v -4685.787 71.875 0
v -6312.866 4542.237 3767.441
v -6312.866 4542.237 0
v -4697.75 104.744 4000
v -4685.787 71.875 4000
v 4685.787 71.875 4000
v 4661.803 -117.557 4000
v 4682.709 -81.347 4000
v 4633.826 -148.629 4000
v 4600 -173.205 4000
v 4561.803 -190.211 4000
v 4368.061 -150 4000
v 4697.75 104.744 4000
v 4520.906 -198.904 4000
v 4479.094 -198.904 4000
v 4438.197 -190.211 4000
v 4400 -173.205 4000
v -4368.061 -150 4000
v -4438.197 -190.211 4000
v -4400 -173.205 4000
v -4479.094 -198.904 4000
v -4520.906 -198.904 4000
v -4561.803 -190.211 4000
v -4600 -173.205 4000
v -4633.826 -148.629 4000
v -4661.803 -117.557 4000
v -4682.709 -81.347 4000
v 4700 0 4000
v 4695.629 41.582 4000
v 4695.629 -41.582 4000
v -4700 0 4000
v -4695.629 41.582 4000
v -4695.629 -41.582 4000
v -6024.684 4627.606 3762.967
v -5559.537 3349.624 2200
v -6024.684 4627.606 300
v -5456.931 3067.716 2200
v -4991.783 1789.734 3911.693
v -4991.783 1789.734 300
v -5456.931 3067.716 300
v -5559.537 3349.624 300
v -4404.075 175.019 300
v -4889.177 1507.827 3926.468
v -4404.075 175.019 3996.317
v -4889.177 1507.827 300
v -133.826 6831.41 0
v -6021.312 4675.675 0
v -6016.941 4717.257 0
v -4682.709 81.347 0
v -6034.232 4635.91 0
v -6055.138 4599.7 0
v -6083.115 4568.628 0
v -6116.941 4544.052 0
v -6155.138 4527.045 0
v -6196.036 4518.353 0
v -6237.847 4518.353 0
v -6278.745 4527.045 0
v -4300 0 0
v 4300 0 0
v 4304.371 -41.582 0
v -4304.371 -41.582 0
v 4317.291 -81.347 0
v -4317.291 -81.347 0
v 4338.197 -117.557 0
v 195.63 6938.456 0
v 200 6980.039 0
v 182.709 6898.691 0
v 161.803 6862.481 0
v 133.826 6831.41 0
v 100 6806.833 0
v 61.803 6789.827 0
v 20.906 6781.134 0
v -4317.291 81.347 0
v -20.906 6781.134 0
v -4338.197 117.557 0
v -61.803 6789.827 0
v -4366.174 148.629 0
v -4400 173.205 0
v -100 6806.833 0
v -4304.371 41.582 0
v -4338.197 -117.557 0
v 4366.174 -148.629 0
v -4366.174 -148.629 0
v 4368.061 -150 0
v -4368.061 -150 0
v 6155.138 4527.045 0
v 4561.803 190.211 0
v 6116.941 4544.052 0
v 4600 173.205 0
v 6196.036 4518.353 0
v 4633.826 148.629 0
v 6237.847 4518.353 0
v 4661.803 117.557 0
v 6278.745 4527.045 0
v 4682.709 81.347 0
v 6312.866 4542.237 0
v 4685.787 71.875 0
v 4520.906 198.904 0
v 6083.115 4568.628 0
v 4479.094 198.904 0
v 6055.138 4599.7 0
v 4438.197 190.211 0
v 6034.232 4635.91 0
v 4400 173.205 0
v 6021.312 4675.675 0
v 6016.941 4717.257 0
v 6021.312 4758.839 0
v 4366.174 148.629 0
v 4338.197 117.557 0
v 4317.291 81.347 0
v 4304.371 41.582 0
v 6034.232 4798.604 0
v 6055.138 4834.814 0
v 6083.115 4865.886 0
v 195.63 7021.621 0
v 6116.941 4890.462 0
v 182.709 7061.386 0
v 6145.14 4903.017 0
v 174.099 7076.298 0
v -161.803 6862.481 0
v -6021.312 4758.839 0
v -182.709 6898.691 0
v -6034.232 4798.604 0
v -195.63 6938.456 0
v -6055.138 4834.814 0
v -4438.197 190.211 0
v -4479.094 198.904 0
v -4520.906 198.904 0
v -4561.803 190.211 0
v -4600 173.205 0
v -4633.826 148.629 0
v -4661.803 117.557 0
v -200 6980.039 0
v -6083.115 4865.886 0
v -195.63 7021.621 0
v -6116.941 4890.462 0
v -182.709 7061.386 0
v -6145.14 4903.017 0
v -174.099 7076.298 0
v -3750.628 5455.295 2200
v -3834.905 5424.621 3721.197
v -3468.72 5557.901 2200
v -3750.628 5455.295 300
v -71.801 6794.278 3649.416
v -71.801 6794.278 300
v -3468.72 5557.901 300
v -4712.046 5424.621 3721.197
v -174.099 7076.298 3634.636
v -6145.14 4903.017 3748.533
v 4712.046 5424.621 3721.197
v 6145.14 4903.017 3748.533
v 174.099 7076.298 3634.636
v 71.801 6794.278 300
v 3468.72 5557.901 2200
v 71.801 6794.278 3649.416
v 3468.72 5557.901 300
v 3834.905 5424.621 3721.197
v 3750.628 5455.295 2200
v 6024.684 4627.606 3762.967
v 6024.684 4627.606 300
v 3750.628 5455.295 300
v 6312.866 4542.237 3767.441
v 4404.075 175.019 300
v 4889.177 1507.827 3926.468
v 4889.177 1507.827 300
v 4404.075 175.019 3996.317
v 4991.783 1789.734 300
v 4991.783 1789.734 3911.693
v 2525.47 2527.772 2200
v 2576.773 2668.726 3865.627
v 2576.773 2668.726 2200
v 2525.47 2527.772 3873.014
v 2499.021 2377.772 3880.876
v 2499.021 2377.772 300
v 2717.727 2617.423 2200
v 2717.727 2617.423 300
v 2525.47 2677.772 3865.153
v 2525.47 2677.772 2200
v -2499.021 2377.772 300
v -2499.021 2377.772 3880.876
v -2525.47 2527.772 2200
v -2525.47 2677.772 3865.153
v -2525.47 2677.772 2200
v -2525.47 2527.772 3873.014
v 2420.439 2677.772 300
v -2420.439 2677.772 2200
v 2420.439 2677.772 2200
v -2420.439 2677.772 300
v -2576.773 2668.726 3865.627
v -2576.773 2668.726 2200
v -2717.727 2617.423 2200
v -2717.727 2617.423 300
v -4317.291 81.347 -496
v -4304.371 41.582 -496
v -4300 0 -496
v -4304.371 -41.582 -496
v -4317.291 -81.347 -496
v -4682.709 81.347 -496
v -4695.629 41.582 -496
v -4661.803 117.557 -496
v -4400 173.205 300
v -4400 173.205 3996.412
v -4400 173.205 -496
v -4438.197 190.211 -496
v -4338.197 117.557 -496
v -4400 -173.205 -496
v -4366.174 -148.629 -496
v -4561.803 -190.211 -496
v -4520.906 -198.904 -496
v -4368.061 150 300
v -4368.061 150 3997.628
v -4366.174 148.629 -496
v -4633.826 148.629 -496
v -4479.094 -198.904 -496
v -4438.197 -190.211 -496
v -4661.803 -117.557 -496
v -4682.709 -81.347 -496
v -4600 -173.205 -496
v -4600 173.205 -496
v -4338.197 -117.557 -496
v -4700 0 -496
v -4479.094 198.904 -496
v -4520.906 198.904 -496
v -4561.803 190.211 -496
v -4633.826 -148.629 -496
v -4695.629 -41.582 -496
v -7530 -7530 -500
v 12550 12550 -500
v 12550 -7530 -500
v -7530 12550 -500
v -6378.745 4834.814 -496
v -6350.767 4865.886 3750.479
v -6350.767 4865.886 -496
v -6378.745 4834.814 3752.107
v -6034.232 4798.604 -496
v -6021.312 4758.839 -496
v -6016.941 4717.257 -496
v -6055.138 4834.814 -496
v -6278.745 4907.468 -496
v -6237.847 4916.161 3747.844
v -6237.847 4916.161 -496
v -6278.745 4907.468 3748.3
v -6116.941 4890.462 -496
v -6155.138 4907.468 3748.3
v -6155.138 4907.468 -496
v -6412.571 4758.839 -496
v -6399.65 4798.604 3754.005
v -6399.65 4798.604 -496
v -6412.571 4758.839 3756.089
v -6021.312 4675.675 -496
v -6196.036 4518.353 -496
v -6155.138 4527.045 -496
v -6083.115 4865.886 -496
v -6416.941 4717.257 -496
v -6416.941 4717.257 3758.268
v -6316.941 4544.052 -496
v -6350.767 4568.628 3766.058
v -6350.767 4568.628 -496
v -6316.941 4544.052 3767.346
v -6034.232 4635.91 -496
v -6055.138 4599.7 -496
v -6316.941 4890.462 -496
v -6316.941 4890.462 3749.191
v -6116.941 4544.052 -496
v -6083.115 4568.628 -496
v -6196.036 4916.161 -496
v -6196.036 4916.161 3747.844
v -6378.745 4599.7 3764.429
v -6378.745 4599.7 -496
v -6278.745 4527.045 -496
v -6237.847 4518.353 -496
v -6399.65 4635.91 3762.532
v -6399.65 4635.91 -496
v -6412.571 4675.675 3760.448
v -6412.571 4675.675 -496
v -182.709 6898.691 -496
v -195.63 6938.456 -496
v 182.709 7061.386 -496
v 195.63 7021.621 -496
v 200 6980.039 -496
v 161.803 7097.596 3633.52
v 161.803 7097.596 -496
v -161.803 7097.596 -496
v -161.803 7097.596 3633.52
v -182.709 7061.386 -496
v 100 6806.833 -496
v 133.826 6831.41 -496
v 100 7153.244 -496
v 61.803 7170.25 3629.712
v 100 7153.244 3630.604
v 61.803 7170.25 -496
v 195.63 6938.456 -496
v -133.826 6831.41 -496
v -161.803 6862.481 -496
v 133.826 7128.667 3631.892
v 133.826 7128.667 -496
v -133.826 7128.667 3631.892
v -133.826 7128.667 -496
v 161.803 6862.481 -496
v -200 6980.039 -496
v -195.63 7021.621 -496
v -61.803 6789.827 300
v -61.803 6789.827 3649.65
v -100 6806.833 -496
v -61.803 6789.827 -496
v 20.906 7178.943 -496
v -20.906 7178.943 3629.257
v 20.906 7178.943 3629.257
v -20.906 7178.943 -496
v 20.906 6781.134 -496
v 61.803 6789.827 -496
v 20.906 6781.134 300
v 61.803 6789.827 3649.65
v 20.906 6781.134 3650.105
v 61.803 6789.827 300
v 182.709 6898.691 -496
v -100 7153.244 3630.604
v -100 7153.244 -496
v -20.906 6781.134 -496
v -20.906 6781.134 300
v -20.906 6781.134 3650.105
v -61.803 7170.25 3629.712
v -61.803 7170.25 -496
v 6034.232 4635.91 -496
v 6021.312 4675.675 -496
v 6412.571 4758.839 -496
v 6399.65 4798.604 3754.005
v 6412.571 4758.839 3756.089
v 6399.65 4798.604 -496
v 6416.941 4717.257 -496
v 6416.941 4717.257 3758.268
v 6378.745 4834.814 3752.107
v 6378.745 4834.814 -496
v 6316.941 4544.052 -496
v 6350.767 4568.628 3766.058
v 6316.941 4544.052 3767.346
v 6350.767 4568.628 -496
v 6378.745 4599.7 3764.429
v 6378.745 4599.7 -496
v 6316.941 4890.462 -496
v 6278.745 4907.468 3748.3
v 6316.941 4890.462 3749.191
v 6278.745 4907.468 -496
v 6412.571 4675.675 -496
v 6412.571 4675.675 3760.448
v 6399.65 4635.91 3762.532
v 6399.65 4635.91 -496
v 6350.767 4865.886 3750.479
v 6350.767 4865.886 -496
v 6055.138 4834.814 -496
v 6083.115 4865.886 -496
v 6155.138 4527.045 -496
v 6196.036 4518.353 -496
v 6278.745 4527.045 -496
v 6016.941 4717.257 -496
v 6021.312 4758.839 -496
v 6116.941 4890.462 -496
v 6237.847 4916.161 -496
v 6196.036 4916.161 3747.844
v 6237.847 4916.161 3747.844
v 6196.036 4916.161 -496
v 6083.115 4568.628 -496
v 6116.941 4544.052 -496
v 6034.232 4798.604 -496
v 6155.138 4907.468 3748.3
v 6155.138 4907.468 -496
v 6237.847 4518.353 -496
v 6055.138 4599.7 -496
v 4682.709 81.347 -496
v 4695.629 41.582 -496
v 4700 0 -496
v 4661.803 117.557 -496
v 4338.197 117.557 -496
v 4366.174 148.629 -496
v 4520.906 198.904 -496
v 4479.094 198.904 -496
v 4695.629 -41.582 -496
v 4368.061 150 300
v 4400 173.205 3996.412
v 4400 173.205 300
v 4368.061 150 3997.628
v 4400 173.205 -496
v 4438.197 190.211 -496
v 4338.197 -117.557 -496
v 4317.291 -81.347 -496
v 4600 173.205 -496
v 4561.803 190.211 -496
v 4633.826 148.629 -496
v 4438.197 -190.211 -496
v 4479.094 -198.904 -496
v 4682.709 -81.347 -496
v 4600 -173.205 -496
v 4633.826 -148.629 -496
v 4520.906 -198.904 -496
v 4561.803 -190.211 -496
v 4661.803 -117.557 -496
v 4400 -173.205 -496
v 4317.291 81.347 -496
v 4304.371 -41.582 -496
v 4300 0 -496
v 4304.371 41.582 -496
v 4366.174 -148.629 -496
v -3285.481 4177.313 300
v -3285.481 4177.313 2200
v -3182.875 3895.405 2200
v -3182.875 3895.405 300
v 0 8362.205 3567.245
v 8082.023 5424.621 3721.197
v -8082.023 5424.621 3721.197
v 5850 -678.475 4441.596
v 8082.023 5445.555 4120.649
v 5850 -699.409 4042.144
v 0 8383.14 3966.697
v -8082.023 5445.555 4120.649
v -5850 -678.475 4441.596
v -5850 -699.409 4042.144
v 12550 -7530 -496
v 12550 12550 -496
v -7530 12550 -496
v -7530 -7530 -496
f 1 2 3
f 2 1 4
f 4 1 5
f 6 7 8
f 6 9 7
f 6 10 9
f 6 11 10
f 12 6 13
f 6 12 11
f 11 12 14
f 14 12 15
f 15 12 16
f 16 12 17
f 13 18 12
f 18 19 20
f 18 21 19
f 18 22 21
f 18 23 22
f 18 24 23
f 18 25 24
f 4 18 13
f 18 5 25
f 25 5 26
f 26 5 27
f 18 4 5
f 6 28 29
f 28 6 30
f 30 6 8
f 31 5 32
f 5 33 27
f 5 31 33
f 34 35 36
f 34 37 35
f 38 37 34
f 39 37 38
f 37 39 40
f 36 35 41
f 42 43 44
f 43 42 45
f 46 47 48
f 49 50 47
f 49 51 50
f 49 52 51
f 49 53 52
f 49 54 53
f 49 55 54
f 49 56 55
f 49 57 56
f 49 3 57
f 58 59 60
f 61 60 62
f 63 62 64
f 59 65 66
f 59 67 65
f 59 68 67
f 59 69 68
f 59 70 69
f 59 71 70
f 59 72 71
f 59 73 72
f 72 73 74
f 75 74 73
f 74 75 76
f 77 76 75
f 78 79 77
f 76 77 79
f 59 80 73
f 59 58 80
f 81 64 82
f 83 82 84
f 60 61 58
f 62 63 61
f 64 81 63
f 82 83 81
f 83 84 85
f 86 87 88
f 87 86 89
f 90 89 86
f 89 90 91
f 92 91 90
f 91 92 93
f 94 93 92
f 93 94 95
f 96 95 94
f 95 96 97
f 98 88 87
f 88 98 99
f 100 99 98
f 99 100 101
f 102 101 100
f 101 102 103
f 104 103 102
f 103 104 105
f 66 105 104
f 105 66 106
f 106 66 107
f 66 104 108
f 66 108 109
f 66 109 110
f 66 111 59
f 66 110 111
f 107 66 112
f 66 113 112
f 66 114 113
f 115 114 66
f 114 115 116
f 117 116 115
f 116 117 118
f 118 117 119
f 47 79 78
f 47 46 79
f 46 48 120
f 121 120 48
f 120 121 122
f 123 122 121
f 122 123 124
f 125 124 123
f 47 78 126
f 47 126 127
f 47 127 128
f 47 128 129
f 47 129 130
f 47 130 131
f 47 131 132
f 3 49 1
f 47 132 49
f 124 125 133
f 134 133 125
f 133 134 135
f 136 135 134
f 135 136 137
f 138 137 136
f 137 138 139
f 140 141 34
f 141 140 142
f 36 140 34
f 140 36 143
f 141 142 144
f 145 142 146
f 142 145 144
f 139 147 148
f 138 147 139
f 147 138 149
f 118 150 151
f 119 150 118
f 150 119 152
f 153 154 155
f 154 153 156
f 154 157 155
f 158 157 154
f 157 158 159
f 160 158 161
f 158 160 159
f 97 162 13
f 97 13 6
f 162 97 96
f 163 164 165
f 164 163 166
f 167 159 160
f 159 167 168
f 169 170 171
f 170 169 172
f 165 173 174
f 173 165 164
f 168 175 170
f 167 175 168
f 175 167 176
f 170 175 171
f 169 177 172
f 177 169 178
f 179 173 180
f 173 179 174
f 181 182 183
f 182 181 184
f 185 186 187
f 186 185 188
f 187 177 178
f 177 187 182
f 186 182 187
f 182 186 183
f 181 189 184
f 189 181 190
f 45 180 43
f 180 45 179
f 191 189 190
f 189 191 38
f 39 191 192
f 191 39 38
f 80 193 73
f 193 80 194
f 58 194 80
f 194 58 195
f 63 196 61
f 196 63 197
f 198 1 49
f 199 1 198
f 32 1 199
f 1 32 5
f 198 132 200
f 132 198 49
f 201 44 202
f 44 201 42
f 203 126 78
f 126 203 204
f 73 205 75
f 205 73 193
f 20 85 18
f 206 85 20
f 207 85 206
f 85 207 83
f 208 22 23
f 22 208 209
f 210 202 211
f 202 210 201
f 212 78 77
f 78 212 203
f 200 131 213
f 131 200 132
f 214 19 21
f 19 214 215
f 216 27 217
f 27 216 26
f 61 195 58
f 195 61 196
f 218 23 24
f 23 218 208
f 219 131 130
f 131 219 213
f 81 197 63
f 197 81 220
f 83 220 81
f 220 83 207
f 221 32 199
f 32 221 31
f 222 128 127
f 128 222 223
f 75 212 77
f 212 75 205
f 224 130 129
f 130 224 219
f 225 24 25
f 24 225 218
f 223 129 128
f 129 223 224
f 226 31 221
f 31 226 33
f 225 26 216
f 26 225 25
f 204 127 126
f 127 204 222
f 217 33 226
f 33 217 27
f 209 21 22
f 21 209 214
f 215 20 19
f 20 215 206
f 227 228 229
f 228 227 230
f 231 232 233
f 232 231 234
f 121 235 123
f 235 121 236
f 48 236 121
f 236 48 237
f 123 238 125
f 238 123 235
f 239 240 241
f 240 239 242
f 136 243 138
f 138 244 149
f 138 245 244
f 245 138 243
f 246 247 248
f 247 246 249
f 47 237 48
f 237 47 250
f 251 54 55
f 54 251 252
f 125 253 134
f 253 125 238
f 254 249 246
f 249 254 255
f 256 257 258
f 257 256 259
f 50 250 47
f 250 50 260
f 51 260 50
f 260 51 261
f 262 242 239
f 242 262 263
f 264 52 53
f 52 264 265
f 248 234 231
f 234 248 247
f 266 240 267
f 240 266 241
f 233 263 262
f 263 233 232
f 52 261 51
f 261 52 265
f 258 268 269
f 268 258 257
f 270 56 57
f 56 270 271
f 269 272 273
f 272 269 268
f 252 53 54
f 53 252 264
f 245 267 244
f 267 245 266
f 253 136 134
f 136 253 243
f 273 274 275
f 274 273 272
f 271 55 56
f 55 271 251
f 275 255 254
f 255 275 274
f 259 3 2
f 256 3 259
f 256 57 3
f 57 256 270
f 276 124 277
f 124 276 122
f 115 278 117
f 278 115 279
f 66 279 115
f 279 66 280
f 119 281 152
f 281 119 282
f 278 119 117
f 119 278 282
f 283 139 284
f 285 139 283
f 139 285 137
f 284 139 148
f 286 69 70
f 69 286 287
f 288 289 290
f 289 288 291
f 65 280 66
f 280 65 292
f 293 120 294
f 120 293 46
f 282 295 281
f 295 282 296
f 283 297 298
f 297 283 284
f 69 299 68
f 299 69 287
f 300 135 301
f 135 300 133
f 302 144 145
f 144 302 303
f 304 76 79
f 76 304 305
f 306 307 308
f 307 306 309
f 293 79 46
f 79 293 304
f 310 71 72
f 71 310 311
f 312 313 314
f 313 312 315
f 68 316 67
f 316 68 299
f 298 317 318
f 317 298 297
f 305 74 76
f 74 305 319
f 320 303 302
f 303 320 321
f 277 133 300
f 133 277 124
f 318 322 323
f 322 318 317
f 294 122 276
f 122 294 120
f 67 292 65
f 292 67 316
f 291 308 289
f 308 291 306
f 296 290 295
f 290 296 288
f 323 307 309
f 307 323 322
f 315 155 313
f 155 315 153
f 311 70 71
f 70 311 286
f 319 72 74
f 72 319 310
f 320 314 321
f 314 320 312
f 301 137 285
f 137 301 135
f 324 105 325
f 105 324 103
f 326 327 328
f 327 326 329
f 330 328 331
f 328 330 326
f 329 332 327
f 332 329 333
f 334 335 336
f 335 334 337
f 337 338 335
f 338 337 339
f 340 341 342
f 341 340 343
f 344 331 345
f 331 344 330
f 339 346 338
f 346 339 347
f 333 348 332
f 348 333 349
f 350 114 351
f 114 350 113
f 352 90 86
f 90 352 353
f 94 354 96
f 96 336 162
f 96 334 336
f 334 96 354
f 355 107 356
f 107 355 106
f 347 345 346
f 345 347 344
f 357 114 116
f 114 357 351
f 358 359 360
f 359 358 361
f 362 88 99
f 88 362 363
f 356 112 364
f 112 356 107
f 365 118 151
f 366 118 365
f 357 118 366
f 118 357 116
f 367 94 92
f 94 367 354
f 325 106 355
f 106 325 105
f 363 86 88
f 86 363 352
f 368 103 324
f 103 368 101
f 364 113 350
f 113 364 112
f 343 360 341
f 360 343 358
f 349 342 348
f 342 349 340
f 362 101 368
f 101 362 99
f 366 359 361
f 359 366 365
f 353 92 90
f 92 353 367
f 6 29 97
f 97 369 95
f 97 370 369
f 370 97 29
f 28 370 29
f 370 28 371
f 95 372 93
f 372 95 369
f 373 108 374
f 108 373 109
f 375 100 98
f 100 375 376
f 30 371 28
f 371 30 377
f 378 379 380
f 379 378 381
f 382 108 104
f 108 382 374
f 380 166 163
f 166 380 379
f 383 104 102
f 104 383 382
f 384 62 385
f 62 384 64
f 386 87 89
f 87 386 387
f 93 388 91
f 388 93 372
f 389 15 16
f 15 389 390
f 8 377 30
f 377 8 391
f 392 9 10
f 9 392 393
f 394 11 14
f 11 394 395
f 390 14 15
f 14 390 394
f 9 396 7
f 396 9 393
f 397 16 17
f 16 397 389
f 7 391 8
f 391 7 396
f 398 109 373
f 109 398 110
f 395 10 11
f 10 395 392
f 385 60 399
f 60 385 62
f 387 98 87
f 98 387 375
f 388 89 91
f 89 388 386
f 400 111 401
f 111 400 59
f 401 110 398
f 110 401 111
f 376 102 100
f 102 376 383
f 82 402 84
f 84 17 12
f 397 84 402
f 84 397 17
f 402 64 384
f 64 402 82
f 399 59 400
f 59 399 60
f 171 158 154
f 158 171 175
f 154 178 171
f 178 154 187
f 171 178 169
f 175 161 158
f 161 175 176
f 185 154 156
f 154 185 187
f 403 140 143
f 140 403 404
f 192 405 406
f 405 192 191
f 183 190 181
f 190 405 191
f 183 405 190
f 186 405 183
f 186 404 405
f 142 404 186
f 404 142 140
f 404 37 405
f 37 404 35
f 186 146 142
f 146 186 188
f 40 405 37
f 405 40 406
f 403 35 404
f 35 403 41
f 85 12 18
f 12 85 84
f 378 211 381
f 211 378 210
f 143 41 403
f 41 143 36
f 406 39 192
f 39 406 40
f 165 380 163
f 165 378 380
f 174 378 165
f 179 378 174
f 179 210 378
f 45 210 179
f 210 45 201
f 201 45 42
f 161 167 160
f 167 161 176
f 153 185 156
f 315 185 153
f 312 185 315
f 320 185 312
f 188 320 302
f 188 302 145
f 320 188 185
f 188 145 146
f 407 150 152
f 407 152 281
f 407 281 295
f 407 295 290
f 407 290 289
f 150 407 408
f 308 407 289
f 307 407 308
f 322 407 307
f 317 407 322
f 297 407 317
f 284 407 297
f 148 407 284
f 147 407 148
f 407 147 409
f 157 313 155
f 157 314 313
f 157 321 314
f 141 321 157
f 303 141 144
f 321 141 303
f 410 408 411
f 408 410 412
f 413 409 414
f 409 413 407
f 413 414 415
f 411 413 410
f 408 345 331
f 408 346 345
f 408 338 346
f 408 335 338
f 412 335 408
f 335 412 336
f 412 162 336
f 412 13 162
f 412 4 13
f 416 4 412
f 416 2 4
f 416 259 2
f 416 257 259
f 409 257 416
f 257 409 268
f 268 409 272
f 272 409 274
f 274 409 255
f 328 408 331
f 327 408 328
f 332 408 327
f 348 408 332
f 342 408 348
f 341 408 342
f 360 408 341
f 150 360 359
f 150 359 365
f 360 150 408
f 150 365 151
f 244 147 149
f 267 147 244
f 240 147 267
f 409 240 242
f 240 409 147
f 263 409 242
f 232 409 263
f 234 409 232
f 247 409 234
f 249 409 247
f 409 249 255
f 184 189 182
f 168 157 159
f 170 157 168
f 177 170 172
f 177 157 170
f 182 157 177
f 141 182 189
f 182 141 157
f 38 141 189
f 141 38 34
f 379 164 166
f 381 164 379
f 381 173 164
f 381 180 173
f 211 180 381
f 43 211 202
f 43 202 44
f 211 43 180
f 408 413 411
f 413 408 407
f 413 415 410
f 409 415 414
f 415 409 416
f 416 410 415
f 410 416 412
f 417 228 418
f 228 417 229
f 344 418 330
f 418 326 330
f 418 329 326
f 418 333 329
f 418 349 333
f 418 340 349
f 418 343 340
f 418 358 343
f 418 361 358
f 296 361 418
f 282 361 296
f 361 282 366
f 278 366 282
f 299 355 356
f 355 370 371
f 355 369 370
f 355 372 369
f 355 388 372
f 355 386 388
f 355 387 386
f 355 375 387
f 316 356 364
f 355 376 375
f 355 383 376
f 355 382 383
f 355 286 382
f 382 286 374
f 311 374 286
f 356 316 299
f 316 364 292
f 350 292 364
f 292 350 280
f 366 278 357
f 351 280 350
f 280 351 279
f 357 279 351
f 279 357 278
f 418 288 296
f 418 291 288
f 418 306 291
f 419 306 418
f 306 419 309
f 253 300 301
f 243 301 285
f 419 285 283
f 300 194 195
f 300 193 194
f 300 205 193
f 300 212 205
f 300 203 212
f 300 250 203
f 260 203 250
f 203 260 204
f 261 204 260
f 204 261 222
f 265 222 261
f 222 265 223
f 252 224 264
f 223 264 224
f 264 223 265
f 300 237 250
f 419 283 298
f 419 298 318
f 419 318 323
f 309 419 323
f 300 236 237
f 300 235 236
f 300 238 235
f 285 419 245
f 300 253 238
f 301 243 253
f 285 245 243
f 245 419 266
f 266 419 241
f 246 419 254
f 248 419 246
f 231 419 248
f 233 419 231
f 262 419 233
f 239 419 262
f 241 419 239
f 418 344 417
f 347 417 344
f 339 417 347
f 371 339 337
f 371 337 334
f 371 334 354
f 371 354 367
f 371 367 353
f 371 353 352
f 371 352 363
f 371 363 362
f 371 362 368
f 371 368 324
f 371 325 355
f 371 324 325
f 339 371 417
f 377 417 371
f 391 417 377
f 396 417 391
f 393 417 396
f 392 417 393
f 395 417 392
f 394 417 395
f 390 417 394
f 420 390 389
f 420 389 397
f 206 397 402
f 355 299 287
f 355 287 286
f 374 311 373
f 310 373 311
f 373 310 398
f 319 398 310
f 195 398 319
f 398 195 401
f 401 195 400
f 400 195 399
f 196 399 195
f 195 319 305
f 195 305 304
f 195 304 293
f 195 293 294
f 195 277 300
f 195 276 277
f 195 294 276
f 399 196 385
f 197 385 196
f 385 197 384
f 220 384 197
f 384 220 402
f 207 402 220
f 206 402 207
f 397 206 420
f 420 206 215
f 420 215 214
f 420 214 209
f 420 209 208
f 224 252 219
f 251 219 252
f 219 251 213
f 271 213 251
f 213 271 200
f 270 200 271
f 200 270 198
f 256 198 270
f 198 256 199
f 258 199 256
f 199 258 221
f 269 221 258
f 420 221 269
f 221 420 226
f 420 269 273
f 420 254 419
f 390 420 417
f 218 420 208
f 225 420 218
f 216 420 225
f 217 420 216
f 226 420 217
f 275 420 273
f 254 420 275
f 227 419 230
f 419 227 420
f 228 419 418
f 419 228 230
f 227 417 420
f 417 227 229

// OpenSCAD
// file: element.scad
// constants
gr = 1.61803; // golden ration

// calculate the coordinates for the corners
function point(i, r, corners) =
   let (vz = 360/corners/2)
   let (angle=i*(360/corners) - vz)
   [ r*cos(angle)
   , r*sin(angle)
   ];

function inbetween(p1, p2, procent) =
    let (x_diff = p2[0] - p1[0])
    let (y_diff = p2[1] - p1[1])
    [ p1[0] + x_diff*procent/100
    , p1[1] + y_diff*procent/100
    ];

module glas_color() {
    color("lightblue")
    children();
}

// create a wall
module wall(p1, p2, h, thickness = 300) {
    let (x_diff = p2[0] - p1[0])
    let (y_diff = p2[1] - p1[1])
    let (len = sqrt(pow(x_diff, 2) +
                    pow(y_diff, 2)))
    linear_extrude(height = h)
    translate(p1)
    rotate(atan2(y_diff, x_diff))
    translate([0, -thickness/2])
    square([len, thickness]);
}

module octagon(r, h, corners) {
    coords=[for (i = [0:corners-1]) point(i, r, corners)];
    linear_extrude(height = h)
    polygon(coords);
}

module octawalls(r, h, wt, corners) {
    difference () {
        octagon(r, h, corners);
        translate([0, 0, -wt])
        octagon(r - wt, h + 2*wt, corners);
    }
}

module window(p1, p2, pos, height, sizex, sizey, wt = 300) {
    assert(0 < pos && pos < 100);
    x_diff = p2[0] - p1[0];
    y_diff = p2[1] - p1[1];
    len = sqrt(pow(x_diff, 2) +
               pow(y_diff, 2));
    difference () {
        children();
        // create the hole for the window
        translate([0,0,height])
        translate(p1 + pos*[x_diff, y_diff]/100)
        rotate(atan2(y_diff, x_diff) + 90, [0,0,1])
        cube([4*wt, sizex, sizey], center = true);
    }
    // add the glass to the window
    glas_color()
    translate([0,0,height])
    translate(p1 + pos*[x_diff, y_diff]/100)
    rotate(atan2(y_diff, x_diff) + 90, [0,0,1])
    translate([wt/2, 0, 0])
    cube([wt/2, sizex, sizey], center = true);
}
// main file
include <element.scad>

// configure the rendering
show_floor = true;
show_roof = true;
show_lawn = true;

// configure the house

// bathroom
bath_l = 2720;
bath_w = 1660;

// bedroom
bed_l = 3320;
bed_w = 2720;

// outer size
house_h = 4000; // house height
room_h = 2200;  // room height
oh = 600;       // over-hang of the roof
log_d = 400;    // log diameter
angle = 20;     // angle of the left and right walls from center
w = 6000;       // front width of winter garden
ws = 1700;      // winter-garden side length
s = ws + bed_l; // left and right wall lengths
o = 1500;       // offset left and right of left and right walls

module win(p1, p2, pos, height, sizex, sizey, wt = 300) {
    window(p1, p2, pos, height, sizex, sizey, wt)
    children();
}

// Corners of the outer walls of house
p1 = [-o + -w/2, 0];
p2 = [-o + -w/2, 0] - [s*sin(angle), -s*cos(angle)];
p3 = [0, p2[1]] - [0, p2[0]*tan(angle)];
p4 = [o + w/2, 0] + [s*sin(angle), s*cos(angle)];
p5 = [o + w/2, 0];
p6 = inbetween(p5, p4, 100*ws/s);
p7 = p6 + bed_w*[-cos(angle), sin(angle)];
p9 = inbetween(p1, p2, 100*ws/s);
p8 = p9 + bed_w*[cos(angle), sin(angle)];

// Corners of the bed-room

// Lawn
if (show_lawn) {
    color("LawnGreen")
    translate([-1.5*s, -1.5*s, -500])
    cube([4*s, 4*s, 4]);
}

module hus() {
    // Windows

    color("MediumSpringGreen")
    union() {
        // Outer walls
        wall(p1, p2, house_h);
        wall(p2, p3, house_h);
        wall(p3, p4, house_h);
        wall(p4, p5, house_h);
        wall(p6, p7, house_h);
        wall(p7, p8, house_h);
        wall(p8, p9, house_h);
    }

    // Inner walls

    // Bed room
    wall(p7, p7 + bed_l*[cos(90-angle), sin(90-angle)], room_h);
    // Bath room and study
    tmp = p8 + bed_l*[-cos(90-angle), sin(90-angle)];
    wall(p8, tmp, room_h);
    wall(inbetween(p9, p2, 50), inbetween(p8, tmp, 50), room_h);

    // Winter garden
    color("azure",0.25)
    wall(p5, p1, house_h);

    // Pillars
    color("Ivory")
    for (p = [p1, p2, p3, p4, p5])
        translate([p[0], p[1], -500]) cylinder(h = house_h + 500, d = log_d);

    if (show_floor) {
        color("Wheat")
        linear_extrude(300)
        polygon([p1, p2, p3, p4, p5]);
    }

    if (show_roof) {
        color("Lavender")
        rotate([-3, 0, 0])
        scale([1.3, 1.3, 1])
        translate([0, -700, house_h])
        linear_extrude(400)
        polygon([p1, p2, p3, p4, p5]);
    }

}

hus();
